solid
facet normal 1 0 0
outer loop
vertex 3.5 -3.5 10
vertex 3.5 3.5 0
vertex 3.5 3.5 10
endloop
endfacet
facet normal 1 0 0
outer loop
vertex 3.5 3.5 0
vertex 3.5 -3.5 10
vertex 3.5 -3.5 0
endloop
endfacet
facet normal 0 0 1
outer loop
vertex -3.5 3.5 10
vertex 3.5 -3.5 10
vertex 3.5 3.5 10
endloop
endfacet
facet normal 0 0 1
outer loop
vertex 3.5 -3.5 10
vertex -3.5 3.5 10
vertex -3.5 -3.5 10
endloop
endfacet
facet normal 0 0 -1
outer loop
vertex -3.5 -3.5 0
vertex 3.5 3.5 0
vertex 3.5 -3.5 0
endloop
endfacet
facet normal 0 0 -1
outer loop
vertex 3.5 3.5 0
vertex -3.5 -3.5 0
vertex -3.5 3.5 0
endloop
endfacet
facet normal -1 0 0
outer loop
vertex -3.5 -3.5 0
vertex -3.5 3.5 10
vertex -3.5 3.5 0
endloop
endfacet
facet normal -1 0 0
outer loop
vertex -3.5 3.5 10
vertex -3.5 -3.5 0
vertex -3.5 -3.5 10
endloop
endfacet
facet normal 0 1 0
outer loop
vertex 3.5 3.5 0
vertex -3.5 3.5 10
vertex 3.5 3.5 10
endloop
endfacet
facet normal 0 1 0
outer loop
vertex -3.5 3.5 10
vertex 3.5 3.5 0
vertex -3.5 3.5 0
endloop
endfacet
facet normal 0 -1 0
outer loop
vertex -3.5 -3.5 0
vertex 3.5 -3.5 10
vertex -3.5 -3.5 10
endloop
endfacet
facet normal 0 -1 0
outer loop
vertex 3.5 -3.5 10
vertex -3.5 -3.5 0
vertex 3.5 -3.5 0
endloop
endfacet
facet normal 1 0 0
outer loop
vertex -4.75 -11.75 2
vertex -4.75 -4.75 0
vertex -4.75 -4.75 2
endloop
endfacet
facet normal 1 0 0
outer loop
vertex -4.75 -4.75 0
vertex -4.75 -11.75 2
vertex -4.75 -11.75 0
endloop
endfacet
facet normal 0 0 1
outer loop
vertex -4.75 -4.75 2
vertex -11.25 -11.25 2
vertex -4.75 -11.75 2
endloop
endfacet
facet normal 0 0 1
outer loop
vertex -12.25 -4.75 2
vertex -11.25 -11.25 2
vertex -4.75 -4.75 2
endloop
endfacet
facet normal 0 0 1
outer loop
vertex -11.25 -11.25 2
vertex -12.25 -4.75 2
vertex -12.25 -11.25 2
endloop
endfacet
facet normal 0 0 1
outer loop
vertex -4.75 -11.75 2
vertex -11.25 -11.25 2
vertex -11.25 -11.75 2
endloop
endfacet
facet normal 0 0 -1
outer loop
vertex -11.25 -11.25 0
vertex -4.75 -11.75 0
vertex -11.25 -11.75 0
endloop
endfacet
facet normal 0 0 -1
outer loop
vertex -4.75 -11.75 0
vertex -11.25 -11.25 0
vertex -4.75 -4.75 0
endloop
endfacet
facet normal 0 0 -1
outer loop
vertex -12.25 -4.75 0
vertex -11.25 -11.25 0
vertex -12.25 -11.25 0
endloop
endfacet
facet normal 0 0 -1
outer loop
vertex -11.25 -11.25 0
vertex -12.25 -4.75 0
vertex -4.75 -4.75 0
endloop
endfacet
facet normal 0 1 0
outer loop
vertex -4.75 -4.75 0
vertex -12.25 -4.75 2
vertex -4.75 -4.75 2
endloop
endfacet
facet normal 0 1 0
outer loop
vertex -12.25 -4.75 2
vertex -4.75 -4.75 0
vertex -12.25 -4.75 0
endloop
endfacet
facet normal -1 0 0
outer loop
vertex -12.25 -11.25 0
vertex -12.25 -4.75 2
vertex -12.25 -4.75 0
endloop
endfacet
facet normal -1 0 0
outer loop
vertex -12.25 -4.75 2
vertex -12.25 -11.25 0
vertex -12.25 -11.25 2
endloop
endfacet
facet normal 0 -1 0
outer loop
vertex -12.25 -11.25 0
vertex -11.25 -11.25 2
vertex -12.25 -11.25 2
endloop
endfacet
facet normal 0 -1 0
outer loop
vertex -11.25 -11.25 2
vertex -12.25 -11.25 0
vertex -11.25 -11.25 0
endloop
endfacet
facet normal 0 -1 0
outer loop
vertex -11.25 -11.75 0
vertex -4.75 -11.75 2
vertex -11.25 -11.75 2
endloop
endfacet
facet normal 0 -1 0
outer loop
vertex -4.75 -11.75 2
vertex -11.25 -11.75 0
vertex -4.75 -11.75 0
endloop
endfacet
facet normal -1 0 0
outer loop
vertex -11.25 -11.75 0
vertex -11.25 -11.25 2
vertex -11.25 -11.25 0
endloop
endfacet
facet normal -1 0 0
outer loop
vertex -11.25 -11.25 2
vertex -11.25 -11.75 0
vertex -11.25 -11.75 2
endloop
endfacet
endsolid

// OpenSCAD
translate([0, 0, 5]) color([0,1,0,0.9]) cube([7, 7, 10], center=true);
translate([-5.0, -5.0, 1]) color([1,0,0]) cube([0.5, 0.5, 2], center=true);
translate([-5.5, -5.0, 1]) color([1,0,0]) cube([0.5, 0.5, 2], center=true);
translate([-6.0, -5.0, 1]) color([1,0,0]) cube([0.5, 0.5, 2], center=true);
translate([-6.5, -5.0, 1]) color([1,0,0]) cube([0.5, 0.5, 2], center=true);
translate([-7.0, -5.0, 1]) color([1,0,0]) cube([0.5, 0.5, 2], center=true);
translate([-7.5, -5.0, 1]) color([1,0,0]) cube([0.5, 0.5, 2], center=true);
translate([-8.0, -5.0, 1]) color([1,0,0]) cube([0.5, 0.5, 2], center=true);
translate([-8.5, -5.0, 1]) color([1,0,0]) cube([0.5, 0.5, 2], center=true);
translate([-9.0, -5.0, 1]) color([1,0,0]) cube([0.5, 0.5, 2], center=true);
translate([-9.5, -5.0, 1]) color([1,0,0]) cube([0.5, 0.5, 2], center=true);
translate([-10.0, -5.0, 1]) color([1,0,0]) cube([0.5, 0.5, 2], center=true);
translate([-10.5, -5.0, 1]) color([1,0,0]) cube([0.5, 0.5, 2], center=true);
translate([-11.0, -5.0, 1]) color([1,0,0]) cube([0.5, 0.5, 2], center=true);
translate([-11.5, -5.0, 1]) color([1,0,0]) cube([0.5, 0.5, 2], center=true);
translate([-12.0, -5.0, 1]) color([1,0,0]) cube([0.5, 0.5, 2], center=true);
translate([-5.0, -5.5, 1]) color([1,0,0]) cube([0.5, 0.5, 2], center=true);
translate([-5.5, -5.5, 1]) color([1,0,0]) cube([0.5, 0.5, 2], center=true);
translate([-6.0, -5.5, 1]) color([1,0,0]) cube([0.5, 0.5, 2], center=true);
translate([-6.5, -5.5, 1]) color([1,0,0]) cube([0.5, 0.5, 2], center=true);
translate([-7.0, -5.5, 1]) color([1,0,0]) cube([0.5, 0.5, 2], center=true);
translate([-7.5, -5.5, 1]) color([1,0,0]) cube([0.5, 0.5, 2], center=true);
translate([-8.0, -5.5, 1]) color([1,0,0]) cube([0.5, 0.5, 2], center=true);
translate([-8.5, -5.5, 1]) color([1,0,0]) cube([0.5, 0.5, 2], center=true);
translate([-9.0, -5.5, 1]) color([1,0,0]) cube([0.5, 0.5, 2], center=true);
translate([-9.5, -5.5, 1]) color([1,0,0]) cube([0.5, 0.5, 2], center=true);
translate([-10.0, -5.5, 1]) color([1,0,0]) cube([0.5, 0.5, 2], center=true);
translate([-10.5, -5.5, 1]) color([1,0,0]) cube([0.5, 0.5, 2], center=true);
translate([-11.0, -5.5, 1]) color([1,0,0]) cube([0.5, 0.5, 2], center=true);
translate([-11.5, -5.5, 1]) color([1,0,0]) cube([0.5, 0.5, 2], center=true);
translate([-12.0, -5.5, 1]) color([1,0,0]) cube([0.5, 0.5, 2], center=true);
translate([-5.0, -6.0, 1]) color([1,0,0]) cube([0.5, 0.5, 2], center=true);
translate([-5.5, -6.0, 1]) color([1,0,0]) cube([0.5, 0.5, 2], center=true);
translate([-6.0, -6.0, 1]) color([1,0,0]) cube([0.5, 0.5, 2], center=true);
translate([-6.5, -6.0, 1]) color([1,0,0]) cube([0.5, 0.5, 2], center=true);
translate([-7.0, -6.0, 1]) color([1,0,0]) cube([0.5, 0.5, 2], center=true);
translate([-7.5, -6.0, 1]) color([1,0,0]) cube([0.5, 0.5, 2], center=true);
translate([-8.0, -6.0, 1]) color([1,0,0]) cube([0.5, 0.5, 2], center=true);
translate([-8.5, -6.0, 1]) color([1,0,0]) cube([0.5, 0.5, 2], center=true);
translate([-9.0, -6.0, 1]) color([1,0,0]) cube([0.5, 0.5, 2], center=true);
translate([-9.5, -6.0, 1]) color([1,0,0]) cube([0.5, 0.5, 2], center=true);
translate([-10.0, -6.0, 1]) color([1,0,0]) cube([0.5, 0.5, 2], center=true);
translate([-10.5, -6.0, 1]) color([1,0,0]) cube([0.5, 0.5, 2], center=true);
translate([-11.0, -6.0, 1]) color([1,0,0]) cube([0.5, 0.5, 2], center=true);
translate([-11.5, -6.0, 1]) color([1,0,0]) cube([0.5, 0.5, 2], center=true);
translate([-12.0, -6.0, 1]) color([1,0,0]) cube([0.5, 0.5, 2], center=true);
translate([-5.0, -6.5, 1]) color([1,0,0]) cube([0.5, 0.5, 2], center=true);
translate([-5.5, -6.5, 1]) color([1,0,0]) cube([0.5, 0.5, 2], center=true);
translate([-6.0, -6.5, 1]) color([1,0,0]) cube([0.5, 0.5, 2], center=true);
translate([-6.5, -6.5, 1]) color([1,0,0]) cube([0.5, 0.5, 2], center=true);
translate([-7.0, -6.5, 1]) color([1,0,0]) cube([0.5, 0.5, 2], center=true);
translate([-7.5, -6.5, 1]) color([1,0,0]) cube([0.5, 0.5, 2], center=true);
translate([-8.0, -6.5, 1]) color([1,0,0]) cube([0.5, 0.5, 2], center=true);
translate([-8.5, -6.5, 1]) color([1,0,0]) cube([0.5, 0.5, 2], center=true);
translate([-9.0, -6.5, 1]) color([1,0,0]) cube([0.5, 0.5, 2], center=true);
translate([-9.5, -6.5, 1]) color([1,0,0]) cube([0.5, 0.5, 2], center=true);
translate([-10.0, -6.5, 1]) color([1,0,0]) cube([0.5, 0.5, 2], center=true);
translate([-10.5, -6.5, 1]) color([1,0,0]) cube([0.5, 0.5, 2], center=true);
translate([-11.0, -6.5, 1]) color([1,0,0]) cube([0.5, 0.5, 2], center=true);
translate([-11.5, -6.5, 1]) color([1,0,0]) cube([0.5, 0.5, 2], center=true);
translate([-12.0, -6.5, 1]) color([1,0,0]) cube([0.5, 0.5, 2], center=true);
translate([-5.0, -7.0, 1]) color([1,0,0]) cube([0.5, 0.5, 2], center=true);
translate([-5.5, -7.0, 1]) color([1,0,0]) cube([0.5, 0.5, 2], center=true);
translate([-6.0, -7.0, 1]) color([1,0,0]) cube([0.5, 0.5, 2], center=true);
translate([-6.5, -7.0, 1]) color([1,0,0]) cube([0.5, 0.5, 2], center=true);
translate([-7.0, -7.0, 1]) color([1,0,0]) cube([0.5, 0.5, 2], center=true);
translate([-7.5, -7.0, 1]) color([1,0,0]) cube([0.5, 0.5, 2], center=true);
translate([-8.0, -7.0, 1]) color([1,0,0]) cube([0.5, 0.5, 2], center=true);
translate([-8.5, -7.0, 1]) color([1,0,0]) cube([0.5, 0.5, 2], center=true);
translate([-9.0, -7.0, 1]) color([1,0,0]) cube([0.5, 0.5, 2], center=true);
translate([-9.5, -7.0, 1]) color([1,0,0]) cube([0.5, 0.5, 2], center=true);
translate([-10.0, -7.0, 1]) color([1,0,0]) cube([0.5, 0.5, 2], center=true);
translate([-10.5, -7.0, 1]) color([1,0,0]) cube([0.5, 0.5, 2], center=true);
translate([-11.0, -7.0, 1]) color([1,0,0]) cube([0.5, 0.5, 2], center=true);
translate([-11.5, -7.0, 1]) color([1,0,0]) cube([0.5, 0.5, 2], center=true);
translate([-12.0, -7.0, 1]) color([1,0,0]) cube([0.5, 0.5, 2], center=true);
translate([-5.0, -7.5, 1]) color([1,0,0]) cube([0.5, 0.5, 2], center=true);
translate([-5.5, -7.5, 1]) color([1,0,0]) cube([0.5, 0.5, 2], center=true);
translate([-6.0, -7.5, 1]) color([1,0,0]) cube([0.5, 0.5, 2], center=true);
translate([-6.5, -7.5, 1]) color([1,0,0]) cube([0.5, 0.5, 2], center=true);
translate([-7.0, -7.5, 1]) color([1,0,0]) cube([0.5, 0.5, 2], center=true);
translate([-7.5, -7.5, 1]) color([1,0,0]) cube([0.5, 0.5, 2], center=true);
translate([-8.0, -7.5, 1]) color([1,0,0]) cube([0.5, 0.5, 2], center=true);
translate([-8.5, -7.5, 1]) color([1,0,0]) cube([0.5, 0.5, 2], center=true);
translate([-9.0, -7.5, 1]) color([1,0,0]) cube([0.5, 0.5, 2], center=true);
translate([-9.5, -7.5, 1]) color([1,0,0]) cube([0.5, 0.5, 2], center=true);
translate([-10.0, -7.5, 1]) color([1,0,0]) cube([0.5, 0.5, 2], center=true);
translate([-10.5, -7.5, 1]) color([1,0,0]) cube([0.5, 0.5, 2], center=true);
translate([-11.0, -7.5, 1]) color([1,0,0]) cube([0.5, 0.5, 2], center=true);
translate([-11.5, -7.5, 1]) color([1,0,0]) cube([0.5, 0.5, 2], center=true);
translate([-12.0, -7.5, 1]) color([1,0,0]) cube([0.5, 0.5, 2], center=true);
translate([-5.0, -8.0, 1]) color([1,0,0]) cube([0.5, 0.5, 2], center=true);
translate([-5.5, -8.0, 1]) color([1,0,0]) cube([0.5, 0.5, 2], center=true);
translate([-6.0, -8.0, 1]) color([1,0,0]) cube([0.5, 0.5, 2], center=true);
translate([-6.5, -8.0, 1]) color([1,0,0]) cube([0.5, 0.5, 2], center=true);
translate([-7.0, -8.0, 1]) color([1,0,0]) cube([0.5, 0.5, 2], center=true);
translate([-7.5, -8.0, 1]) color([1,0,0]) cube([0.5, 0.5, 2], center=true);
translate([-8.0, -8.0, 1]) color([1,0,0]) cube([0.5, 0.5, 2], center=true);
translate([-8.5, -8.0, 1]) color([1,0,0]) cube([0.5, 0.5, 2], center=true);
translate([-9.0, -8.0, 1]) color([1,0,0]) cube([0.5, 0.5, 2], center=true);
translate([-9.5, -8.0, 1]) color([1,0,0]) cube([0.5, 0.5, 2], center=true);
translate([-10.0, -8.0, 1]) color([1,0,0]) cube([0.5, 0.5, 2], center=true);
translate([-10.5, -8.0, 1]) color([1,0,0]) cube([0.5, 0.5, 2], center=true);
translate([-11.0, -8.0, 1]) color([1,0,0]) cube([0.5, 0.5, 2], center=true);
translate([-11.5, -8.0, 1]) color([1,0,0]) cube([0.5, 0.5, 2], center=true);
translate([-12.0, -8.0, 1]) color([1,0,0]) cube([0.5, 0.5, 2], center=true);
translate([-5.0, -8.5, 1]) color([1,0,0]) cube([0.5, 0.5, 2], center=true);
translate([-5.5, -8.5, 1]) color([1,0,0]) cube([0.5, 0.5, 2], center=true);
translate([-6.0, -8.5, 1]) color([1,0,0]) cube([0.5, 0.5, 2], center=true);
translate([-6.5, -8.5, 1]) color([1,0,0]) cube([0.5, 0.5, 2], center=true);
translate([-7.0, -8.5, 1]) color([1,0,0]) cube([0.5, 0.5, 2], center=true);
translate([-7.5, -8.5, 1]) color([1,0,0]) cube([0.5, 0.5, 2], center=true);
translate([-8.0, -8.5, 1]) color([1,0,0]) cube([0.5, 0.5, 2], center=true);
translate([-8.5, -8.5, 1]) color([1,0,0]) cube([0.5, 0.5, 2], center=true);
translate([-9.0, -8.5, 1]) color([1,0,0]) cube([0.5, 0.5, 2], center=true);
translate([-9.5, -8.5, 1]) color([1,0,0]) cube([0.5, 0.5, 2], center=true);
translate([-10.0, -8.5, 1]) color([1,0,0]) cube([0.5, 0.5, 2], center=true);
translate([-10.5, -8.5, 1]) color([1,0,0]) cube([0.5, 0.5, 2], center=true);
translate([-11.0, -8.5, 1]) color([1,0,0]) cube([0.5, 0.5, 2], center=true);
translate([-11.5, -8.5, 1]) color([1,0,0]) cube([0.5, 0.5, 2], center=true);
translate([-12.0, -8.5, 1]) color([1,0,0]) cube([0.5, 0.5, 2], center=true);
translate([-5.0, -9.0, 1]) color([1,0,0]) cube([0.5, 0.5, 2], center=true);
translate([-5.5, -9.0, 1]) color([1,0,0]) cube([0.5, 0.5, 2], center=true);
translate([-6.0, -9.0, 1]) color([1,0,0]) cube([0.5, 0.5, 2], center=true);
translate([-6.5, -9.0, 1]) color([1,0,0]) cube([0.5, 0.5, 2], center=true);
translate([-7.0, -9.0, 1]) color([1,0,0]) cube([0.5, 0.5, 2], center=true);
translate([-7.5, -9.0, 1]) color([1,0,0]) cube([0.5, 0.5, 2], center=true);
translate([-8.0, -9.0, 1]) color([1,0,0]) cube([0.5, 0.5, 2], center=true);
translate([-8.5, -9.0, 1]) color([1,0,0]) cube([0.5, 0.5, 2], center=true);
translate([-9.0, -9.0, 1]) color([1,0,0]) cube([0.5, 0.5, 2], center=true);
translate([-9.5, -9.0, 1]) color([1,0,0]) cube([0.5, 0.5, 2], center=true);
translate([-10.0, -9.0, 1]) color([1,0,0]) cube([0.5, 0.5, 2], center=true);
translate([-10.5, -9.0, 1]) color([1,0,0]) cube([0.5, 0.5, 2], center=true);
translate([-11.0, -9.0, 1]) color([1,0,0]) cube([0.5, 0.5, 2], center=true);
translate([-11.5, -9.0, 1]) color([1,0,0]) cube([0.5, 0.5, 2], center=true);
translate([-12.0, -9.0, 1]) color([1,0,0]) cube([0.5, 0.5, 2], center=true);
translate([-5.0, -9.5, 1]) color([1,0,0]) cube([0.5, 0.5, 2], center=true);
translate([-5.5, -9.5, 1]) color([1,0,0]) cube([0.5, 0.5, 2], center=true);
translate([-6.0, -9.5, 1]) color([1,0,0]) cube([0.5, 0.5, 2], center=true);
translate([-6.5, -9.5, 1]) color([1,0,0]) cube([0.5, 0.5, 2], center=true);
translate([-7.0, -9.5, 1]) color([1,0,0]) cube([0.5, 0.5, 2], center=true);
translate([-7.5, -9.5, 1]) color([1,0,0]) cube([0.5, 0.5, 2], center=true);
translate([-8.0, -9.5, 1]) color([1,0,0]) cube([0.5, 0.5, 2], center=true);
translate([-8.5, -9.5, 1]) color([1,0,0]) cube([0.5, 0.5, 2], center=true);
translate([-9.0, -9.5, 1]) color([1,0,0]) cube([0.5, 0.5, 2], center=true);
translate([-9.5, -9.5, 1]) color([1,0,0]) cube([0.5, 0.5, 2], center=true);
translate([-10.0, -9.5, 1]) color([1,0,0]) cube([0.5, 0.5, 2], center=true);
translate([-10.5, -9.5, 1]) color([1,0,0]) cube([0.5, 0.5, 2], center=true);
translate([-11.0, -9.5, 1]) color([1,0,0]) cube([0.5, 0.5, 2], center=true);
translate([-11.5, -9.5, 1]) color([1,0,0]) cube([0.5, 0.5, 2], center=true);
translate([-12.0, -9.5, 1]) color([1,0,0]) cube([0.5, 0.5, 2], center=true);
translate([-5.0, -10.0, 1]) color([1,0,0]) cube([0.5, 0.5, 2], center=true);
translate([-5.5, -10.0, 1]) color([1,0,0]) cube([0.5, 0.5, 2], center=true);
translate([-6.0, -10.0, 1]) color([1,0,0]) cube([0.5, 0.5, 2], center=true);
translate([-6.5, -10.0, 1]) color([1,0,0]) cube([0.5, 0.5, 2], center=true);
translate([-7.0, -10.0, 1]) color([1,0,0]) cube([0.5, 0.5, 2], center=true);
translate([-7.5, -10.0, 1]) color([1,0,0]) cube([0.5, 0.5, 2], center=true);
translate([-8.0, -10.0, 1]) color([1,0,0]) cube([0.5, 0.5, 2], center=true);
translate([-8.5, -10.0, 1]) color([1,0,0]) cube([0.5, 0.5, 2], center=true);
translate([-9.0, -10.0, 1]) color([1,0,0]) cube([0.5, 0.5, 2], center=true);
translate([-9.5, -10.0, 1]) color([1,0,0]) cube([0.5, 0.5, 2], center=true);
translate([-10.0, -10.0, 1]) color([1,0,0]) cube([0.5, 0.5, 2], center=true);
translate([-10.5, -10.0, 1]) color([1,0,0]) cube([0.5, 0.5, 2], center=true);
translate([-11.0, -10.0, 1]) color([1,0,0]) cube([0.5, 0.5, 2], center=true);
translate([-11.5, -10.0, 1]) color([1,0,0]) cube([0.5, 0.5, 2], center=true);
translate([-12.0, -10.0, 1]) color([1,0,0]) cube([0.5, 0.5, 2], center=true);
translate([-5.0, -10.5, 1]) color([1,0,0]) cube([0.5, 0.5, 2], center=true);
translate([-5.5, -10.5, 1]) color([1,0,0]) cube([0.5, 0.5, 2], center=true);
translate([-6.0, -10.5, 1]) color([1,0,0]) cube([0.5, 0.5, 2], center=true);
translate([-6.5, -10.5, 1]) color([1,0,0]) cube([0.5, 0.5, 2], center=true);
translate([-7.0, -10.5, 1]) color([1,0,0]) cube([0.5, 0.5, 2], center=true);
translate([-7.5, -10.5, 1]) color([1,0,0]) cube([0.5, 0.5, 2], center=true);
translate([-8.0, -10.5, 1]) color([1,0,0]) cube([0.5, 0.5, 2], center=true);
translate([-8.5, -10.5, 1]) color([1,0,0]) cube([0.5, 0.5, 2], center=true);
translate([-9.0, -10.5, 1]) color([1,0,0]) cube([0.5, 0.5, 2], center=true);
translate([-9.5, -10.5, 1]) color([1,0,0]) cube([0.5, 0.5, 2], center=true);
translate([-10.0, -10.5, 1]) color([1,0,0]) cube([0.5, 0.5, 2], center=true);
translate([-10.5, -10.5, 1]) color([1,0,0]) cube([0.5, 0.5, 2], center=true);
translate([-11.0, -10.5, 1]) color([1,0,0]) cube([0.5, 0.5, 2], center=true);
translate([-11.5, -10.5, 1]) color([1,0,0]) cube([0.5, 0.5, 2], center=true);
translate([-12.0, -10.5, 1]) color([1,0,0]) cube([0.5, 0.5, 2], center=true);
translate([-5.0, -11.0, 1]) color([1,0,0]) cube([0.5, 0.5, 2], center=true);
translate([-5.5, -11.0, 1]) color([1,0,0]) cube([0.5, 0.5, 2], center=true);
translate([-6.0, -11.0, 1]) color([1,0,0]) cube([0.5, 0.5, 2], center=true);
translate([-6.5, -11.0, 1]) color([1,0,0]) cube([0.5, 0.5, 2], center=true);
translate([-7.0, -11.0, 1]) color([1,0,0]) cube([0.5, 0.5, 2], center=true);
translate([-7.5, -11.0, 1]) color([1,0,0]) cube([0.5, 0.5, 2], center=true);
translate([-8.0, -11.0, 1]) color([1,0,0]) cube([0.5, 0.5, 2], center=true);
translate([-8.5, -11.0, 1]) color([1,0,0]) cube([0.5, 0.5, 2], center=true);
translate([-9.0, -11.0, 1]) color([1,0,0]) cube([0.5, 0.5, 2], center=true);
translate([-9.5, -11.0, 1]) color([1,0,0]) cube([0.5, 0.5, 2], center=true);
translate([-10.0, -11.0, 1]) color([1,0,0]) cube([0.5, 0.5, 2], center=true);
translate([-10.5, -11.0, 1]) color([1,0,0]) cube([0.5, 0.5, 2], center=true);
translate([-11.0, -11.0, 1]) color([1,0,0]) cube([0.5, 0.5, 2], center=true);
translate([-11.5, -11.0, 1]) color([1,0,0]) cube([0.5, 0.5, 2], center=true);
translate([-12.0, -11.0, 1]) color([1,0,0]) cube([0.5, 0.5, 2], center=true);
translate([-5.0, -11.5, 1]) color([1,0,0]) cube([0.5, 0.5, 2], center=true);
translate([-5.5, -11.5, 1]) color([1,0,0]) cube([0.5, 0.5, 2], center=true);
translate([-6.0, -11.5, 1]) color([1,0,0]) cube([0.5, 0.5, 2], center=true);
translate([-6.5, -11.5, 1]) color([1,0,0]) cube([0.5, 0.5, 2], center=true);
translate([-7.0, -11.5, 1]) color([1,0,0]) cube([0.5, 0.5, 2], center=true);
translate([-7.5, -11.5, 1]) color([1,0,0]) cube([0.5, 0.5, 2], center=true);
translate([-8.0, -11.5, 1]) color([1,0,0]) cube([0.5, 0.5, 2], center=true);
translate([-8.5, -11.5, 1]) color([1,0,0]) cube([0.5, 0.5, 2], center=true);
translate([-9.0, -11.5, 1]) color([1,0,0]) cube([0.5, 0.5, 2], center=true);
translate([-9.5, -11.5, 1]) color([1,0,0]) cube([0.5, 0.5, 2], center=true);
translate([-10.0, -11.5, 1]) color([1,0,0]) cube([0.5, 0.5, 2], center=true);
translate([-10.5, -11.5, 1]) color([1,0,0]) cube([0.5, 0.5, 2], center=true);
translate([-11.0, -11.5, 1]) color([1,0,0]) cube([0.5, 0.5, 2], center=true);
